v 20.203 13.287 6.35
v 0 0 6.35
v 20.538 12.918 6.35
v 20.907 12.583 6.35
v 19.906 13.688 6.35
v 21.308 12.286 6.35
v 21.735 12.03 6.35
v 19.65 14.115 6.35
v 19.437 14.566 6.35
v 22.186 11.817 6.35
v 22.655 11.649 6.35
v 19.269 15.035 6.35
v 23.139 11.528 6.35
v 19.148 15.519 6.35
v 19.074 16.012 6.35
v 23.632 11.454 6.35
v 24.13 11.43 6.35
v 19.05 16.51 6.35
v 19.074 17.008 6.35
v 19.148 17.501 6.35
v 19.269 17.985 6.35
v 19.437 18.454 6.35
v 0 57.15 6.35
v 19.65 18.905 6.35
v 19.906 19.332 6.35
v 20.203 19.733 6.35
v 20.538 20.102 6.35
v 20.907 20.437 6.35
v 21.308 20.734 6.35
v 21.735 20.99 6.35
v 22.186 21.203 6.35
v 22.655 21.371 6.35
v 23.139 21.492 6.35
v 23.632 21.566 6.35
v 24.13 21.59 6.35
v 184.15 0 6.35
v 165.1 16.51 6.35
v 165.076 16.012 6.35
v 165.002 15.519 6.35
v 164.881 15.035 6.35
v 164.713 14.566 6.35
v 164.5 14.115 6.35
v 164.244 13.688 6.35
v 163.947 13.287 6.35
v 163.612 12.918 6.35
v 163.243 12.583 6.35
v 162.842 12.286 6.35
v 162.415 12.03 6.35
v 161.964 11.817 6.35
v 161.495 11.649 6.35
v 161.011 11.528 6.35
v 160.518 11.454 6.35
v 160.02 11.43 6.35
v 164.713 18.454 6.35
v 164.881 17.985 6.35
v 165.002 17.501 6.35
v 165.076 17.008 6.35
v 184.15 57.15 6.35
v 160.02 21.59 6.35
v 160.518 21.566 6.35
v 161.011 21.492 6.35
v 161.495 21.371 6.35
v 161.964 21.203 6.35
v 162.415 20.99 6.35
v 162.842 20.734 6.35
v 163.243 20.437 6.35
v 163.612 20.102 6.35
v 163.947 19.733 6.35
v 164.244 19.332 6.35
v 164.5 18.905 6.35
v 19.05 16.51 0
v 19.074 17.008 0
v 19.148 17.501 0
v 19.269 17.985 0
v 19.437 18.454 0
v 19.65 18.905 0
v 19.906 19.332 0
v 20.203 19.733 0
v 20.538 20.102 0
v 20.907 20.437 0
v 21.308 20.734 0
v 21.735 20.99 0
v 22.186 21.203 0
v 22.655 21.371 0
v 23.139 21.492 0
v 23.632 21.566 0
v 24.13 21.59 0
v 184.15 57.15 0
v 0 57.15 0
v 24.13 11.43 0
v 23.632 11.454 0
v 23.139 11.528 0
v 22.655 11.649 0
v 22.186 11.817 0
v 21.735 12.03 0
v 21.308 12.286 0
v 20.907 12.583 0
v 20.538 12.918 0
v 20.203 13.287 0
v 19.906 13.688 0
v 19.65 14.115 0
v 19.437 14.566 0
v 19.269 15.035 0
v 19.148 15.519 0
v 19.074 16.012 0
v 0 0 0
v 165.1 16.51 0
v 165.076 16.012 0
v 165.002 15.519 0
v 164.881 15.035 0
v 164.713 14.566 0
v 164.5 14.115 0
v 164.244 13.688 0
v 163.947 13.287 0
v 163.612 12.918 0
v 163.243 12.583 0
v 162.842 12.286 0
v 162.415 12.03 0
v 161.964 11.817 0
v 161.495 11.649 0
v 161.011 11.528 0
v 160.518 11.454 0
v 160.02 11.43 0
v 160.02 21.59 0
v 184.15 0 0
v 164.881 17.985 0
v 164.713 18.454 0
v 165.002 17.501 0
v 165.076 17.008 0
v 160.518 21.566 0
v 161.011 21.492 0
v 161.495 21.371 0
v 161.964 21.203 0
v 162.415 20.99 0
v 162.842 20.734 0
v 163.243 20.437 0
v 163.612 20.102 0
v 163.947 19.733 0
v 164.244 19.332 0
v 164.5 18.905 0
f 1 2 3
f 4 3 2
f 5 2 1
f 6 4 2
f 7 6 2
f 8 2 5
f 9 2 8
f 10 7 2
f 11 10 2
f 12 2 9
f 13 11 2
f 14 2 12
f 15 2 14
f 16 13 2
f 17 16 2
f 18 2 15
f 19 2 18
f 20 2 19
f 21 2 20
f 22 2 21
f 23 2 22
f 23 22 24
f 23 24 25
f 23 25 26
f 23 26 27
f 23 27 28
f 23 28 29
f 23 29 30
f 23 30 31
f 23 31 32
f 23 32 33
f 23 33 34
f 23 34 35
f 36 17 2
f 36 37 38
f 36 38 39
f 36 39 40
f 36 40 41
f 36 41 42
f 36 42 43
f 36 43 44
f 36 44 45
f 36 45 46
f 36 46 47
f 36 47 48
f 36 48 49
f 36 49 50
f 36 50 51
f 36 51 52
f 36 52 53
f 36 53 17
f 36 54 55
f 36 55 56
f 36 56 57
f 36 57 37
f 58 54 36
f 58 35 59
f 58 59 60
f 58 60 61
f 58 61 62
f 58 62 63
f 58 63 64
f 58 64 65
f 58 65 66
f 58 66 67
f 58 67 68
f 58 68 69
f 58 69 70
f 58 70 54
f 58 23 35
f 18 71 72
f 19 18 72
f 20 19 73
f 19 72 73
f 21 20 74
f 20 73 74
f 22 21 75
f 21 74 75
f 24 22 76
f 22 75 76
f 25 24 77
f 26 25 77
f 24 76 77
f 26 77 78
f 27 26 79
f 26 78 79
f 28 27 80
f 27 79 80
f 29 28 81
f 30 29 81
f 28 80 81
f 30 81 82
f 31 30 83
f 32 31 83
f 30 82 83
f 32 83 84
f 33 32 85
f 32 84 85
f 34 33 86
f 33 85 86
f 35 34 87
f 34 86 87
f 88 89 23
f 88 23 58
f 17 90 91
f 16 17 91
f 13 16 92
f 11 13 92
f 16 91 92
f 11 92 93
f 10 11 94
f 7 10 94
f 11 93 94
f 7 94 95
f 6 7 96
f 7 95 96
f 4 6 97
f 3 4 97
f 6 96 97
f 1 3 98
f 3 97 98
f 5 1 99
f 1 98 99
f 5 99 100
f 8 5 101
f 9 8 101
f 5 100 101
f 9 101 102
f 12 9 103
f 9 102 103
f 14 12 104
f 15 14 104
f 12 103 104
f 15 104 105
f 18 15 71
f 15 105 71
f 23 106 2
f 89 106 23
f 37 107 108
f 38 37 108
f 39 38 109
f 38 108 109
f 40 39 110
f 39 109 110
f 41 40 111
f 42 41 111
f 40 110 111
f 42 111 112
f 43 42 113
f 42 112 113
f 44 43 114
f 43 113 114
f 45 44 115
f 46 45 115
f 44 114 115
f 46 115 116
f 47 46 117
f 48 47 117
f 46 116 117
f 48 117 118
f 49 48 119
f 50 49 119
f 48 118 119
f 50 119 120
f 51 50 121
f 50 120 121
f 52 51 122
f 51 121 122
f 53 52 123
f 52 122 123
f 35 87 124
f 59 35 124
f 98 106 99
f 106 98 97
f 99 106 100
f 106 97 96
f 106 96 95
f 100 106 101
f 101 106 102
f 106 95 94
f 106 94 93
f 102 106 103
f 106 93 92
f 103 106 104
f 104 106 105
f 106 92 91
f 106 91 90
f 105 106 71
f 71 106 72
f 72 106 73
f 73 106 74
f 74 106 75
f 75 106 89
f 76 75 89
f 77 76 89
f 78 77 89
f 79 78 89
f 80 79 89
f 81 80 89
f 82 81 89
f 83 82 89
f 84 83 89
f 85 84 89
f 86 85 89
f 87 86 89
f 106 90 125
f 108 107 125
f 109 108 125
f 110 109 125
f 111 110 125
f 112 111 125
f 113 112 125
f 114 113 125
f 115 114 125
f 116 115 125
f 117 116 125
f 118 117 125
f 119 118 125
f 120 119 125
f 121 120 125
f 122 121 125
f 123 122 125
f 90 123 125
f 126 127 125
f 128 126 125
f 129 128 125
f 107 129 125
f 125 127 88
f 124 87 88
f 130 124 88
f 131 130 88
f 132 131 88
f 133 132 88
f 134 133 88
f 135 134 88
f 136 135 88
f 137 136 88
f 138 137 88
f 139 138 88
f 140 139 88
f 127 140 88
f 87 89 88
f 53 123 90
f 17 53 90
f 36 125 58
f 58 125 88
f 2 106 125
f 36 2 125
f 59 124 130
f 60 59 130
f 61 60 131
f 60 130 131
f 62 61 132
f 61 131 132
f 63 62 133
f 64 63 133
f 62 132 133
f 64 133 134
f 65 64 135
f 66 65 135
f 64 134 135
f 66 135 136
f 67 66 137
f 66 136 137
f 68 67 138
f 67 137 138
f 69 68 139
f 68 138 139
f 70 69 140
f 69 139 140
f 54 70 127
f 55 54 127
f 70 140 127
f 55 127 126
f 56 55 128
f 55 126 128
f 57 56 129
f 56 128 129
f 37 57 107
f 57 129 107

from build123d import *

# Parameters (mm, degrees)
F0_W     = 184.15
F0_H     = 57.15
F1_DEPTH = 6.35


with BuildPart() as f1:
    # F0 (on Top) → F1 (new body)
    with BuildSketch(Plane.XY):
        with Locations((92.075, 28.575)):
            Rectangle(F0_W, F0_H)
        with BuildLine():
            Line((160.02, 11.43), (24.13, 11.43))
            ThreePointArc((24.13, 11.43), (20.537898, 12.917898), (19.05, 16.51))
            ThreePointArc((19.05, 16.51), (20.537898, 20.102102), (24.13, 21.59))
            Line((24.13, 21.59), (160.02, 21.59))
            ThreePointArc((160.02, 21.59), (163.612102, 20.102102), (165.1, 16.51))
            ThreePointArc((165.1, 16.51), (163.612102, 12.917898), (160.02, 11.43))
        make_face(mode=Mode.SUBTRACT)
    extrude(amount=F1_DEPTH)


solid = f1.part
